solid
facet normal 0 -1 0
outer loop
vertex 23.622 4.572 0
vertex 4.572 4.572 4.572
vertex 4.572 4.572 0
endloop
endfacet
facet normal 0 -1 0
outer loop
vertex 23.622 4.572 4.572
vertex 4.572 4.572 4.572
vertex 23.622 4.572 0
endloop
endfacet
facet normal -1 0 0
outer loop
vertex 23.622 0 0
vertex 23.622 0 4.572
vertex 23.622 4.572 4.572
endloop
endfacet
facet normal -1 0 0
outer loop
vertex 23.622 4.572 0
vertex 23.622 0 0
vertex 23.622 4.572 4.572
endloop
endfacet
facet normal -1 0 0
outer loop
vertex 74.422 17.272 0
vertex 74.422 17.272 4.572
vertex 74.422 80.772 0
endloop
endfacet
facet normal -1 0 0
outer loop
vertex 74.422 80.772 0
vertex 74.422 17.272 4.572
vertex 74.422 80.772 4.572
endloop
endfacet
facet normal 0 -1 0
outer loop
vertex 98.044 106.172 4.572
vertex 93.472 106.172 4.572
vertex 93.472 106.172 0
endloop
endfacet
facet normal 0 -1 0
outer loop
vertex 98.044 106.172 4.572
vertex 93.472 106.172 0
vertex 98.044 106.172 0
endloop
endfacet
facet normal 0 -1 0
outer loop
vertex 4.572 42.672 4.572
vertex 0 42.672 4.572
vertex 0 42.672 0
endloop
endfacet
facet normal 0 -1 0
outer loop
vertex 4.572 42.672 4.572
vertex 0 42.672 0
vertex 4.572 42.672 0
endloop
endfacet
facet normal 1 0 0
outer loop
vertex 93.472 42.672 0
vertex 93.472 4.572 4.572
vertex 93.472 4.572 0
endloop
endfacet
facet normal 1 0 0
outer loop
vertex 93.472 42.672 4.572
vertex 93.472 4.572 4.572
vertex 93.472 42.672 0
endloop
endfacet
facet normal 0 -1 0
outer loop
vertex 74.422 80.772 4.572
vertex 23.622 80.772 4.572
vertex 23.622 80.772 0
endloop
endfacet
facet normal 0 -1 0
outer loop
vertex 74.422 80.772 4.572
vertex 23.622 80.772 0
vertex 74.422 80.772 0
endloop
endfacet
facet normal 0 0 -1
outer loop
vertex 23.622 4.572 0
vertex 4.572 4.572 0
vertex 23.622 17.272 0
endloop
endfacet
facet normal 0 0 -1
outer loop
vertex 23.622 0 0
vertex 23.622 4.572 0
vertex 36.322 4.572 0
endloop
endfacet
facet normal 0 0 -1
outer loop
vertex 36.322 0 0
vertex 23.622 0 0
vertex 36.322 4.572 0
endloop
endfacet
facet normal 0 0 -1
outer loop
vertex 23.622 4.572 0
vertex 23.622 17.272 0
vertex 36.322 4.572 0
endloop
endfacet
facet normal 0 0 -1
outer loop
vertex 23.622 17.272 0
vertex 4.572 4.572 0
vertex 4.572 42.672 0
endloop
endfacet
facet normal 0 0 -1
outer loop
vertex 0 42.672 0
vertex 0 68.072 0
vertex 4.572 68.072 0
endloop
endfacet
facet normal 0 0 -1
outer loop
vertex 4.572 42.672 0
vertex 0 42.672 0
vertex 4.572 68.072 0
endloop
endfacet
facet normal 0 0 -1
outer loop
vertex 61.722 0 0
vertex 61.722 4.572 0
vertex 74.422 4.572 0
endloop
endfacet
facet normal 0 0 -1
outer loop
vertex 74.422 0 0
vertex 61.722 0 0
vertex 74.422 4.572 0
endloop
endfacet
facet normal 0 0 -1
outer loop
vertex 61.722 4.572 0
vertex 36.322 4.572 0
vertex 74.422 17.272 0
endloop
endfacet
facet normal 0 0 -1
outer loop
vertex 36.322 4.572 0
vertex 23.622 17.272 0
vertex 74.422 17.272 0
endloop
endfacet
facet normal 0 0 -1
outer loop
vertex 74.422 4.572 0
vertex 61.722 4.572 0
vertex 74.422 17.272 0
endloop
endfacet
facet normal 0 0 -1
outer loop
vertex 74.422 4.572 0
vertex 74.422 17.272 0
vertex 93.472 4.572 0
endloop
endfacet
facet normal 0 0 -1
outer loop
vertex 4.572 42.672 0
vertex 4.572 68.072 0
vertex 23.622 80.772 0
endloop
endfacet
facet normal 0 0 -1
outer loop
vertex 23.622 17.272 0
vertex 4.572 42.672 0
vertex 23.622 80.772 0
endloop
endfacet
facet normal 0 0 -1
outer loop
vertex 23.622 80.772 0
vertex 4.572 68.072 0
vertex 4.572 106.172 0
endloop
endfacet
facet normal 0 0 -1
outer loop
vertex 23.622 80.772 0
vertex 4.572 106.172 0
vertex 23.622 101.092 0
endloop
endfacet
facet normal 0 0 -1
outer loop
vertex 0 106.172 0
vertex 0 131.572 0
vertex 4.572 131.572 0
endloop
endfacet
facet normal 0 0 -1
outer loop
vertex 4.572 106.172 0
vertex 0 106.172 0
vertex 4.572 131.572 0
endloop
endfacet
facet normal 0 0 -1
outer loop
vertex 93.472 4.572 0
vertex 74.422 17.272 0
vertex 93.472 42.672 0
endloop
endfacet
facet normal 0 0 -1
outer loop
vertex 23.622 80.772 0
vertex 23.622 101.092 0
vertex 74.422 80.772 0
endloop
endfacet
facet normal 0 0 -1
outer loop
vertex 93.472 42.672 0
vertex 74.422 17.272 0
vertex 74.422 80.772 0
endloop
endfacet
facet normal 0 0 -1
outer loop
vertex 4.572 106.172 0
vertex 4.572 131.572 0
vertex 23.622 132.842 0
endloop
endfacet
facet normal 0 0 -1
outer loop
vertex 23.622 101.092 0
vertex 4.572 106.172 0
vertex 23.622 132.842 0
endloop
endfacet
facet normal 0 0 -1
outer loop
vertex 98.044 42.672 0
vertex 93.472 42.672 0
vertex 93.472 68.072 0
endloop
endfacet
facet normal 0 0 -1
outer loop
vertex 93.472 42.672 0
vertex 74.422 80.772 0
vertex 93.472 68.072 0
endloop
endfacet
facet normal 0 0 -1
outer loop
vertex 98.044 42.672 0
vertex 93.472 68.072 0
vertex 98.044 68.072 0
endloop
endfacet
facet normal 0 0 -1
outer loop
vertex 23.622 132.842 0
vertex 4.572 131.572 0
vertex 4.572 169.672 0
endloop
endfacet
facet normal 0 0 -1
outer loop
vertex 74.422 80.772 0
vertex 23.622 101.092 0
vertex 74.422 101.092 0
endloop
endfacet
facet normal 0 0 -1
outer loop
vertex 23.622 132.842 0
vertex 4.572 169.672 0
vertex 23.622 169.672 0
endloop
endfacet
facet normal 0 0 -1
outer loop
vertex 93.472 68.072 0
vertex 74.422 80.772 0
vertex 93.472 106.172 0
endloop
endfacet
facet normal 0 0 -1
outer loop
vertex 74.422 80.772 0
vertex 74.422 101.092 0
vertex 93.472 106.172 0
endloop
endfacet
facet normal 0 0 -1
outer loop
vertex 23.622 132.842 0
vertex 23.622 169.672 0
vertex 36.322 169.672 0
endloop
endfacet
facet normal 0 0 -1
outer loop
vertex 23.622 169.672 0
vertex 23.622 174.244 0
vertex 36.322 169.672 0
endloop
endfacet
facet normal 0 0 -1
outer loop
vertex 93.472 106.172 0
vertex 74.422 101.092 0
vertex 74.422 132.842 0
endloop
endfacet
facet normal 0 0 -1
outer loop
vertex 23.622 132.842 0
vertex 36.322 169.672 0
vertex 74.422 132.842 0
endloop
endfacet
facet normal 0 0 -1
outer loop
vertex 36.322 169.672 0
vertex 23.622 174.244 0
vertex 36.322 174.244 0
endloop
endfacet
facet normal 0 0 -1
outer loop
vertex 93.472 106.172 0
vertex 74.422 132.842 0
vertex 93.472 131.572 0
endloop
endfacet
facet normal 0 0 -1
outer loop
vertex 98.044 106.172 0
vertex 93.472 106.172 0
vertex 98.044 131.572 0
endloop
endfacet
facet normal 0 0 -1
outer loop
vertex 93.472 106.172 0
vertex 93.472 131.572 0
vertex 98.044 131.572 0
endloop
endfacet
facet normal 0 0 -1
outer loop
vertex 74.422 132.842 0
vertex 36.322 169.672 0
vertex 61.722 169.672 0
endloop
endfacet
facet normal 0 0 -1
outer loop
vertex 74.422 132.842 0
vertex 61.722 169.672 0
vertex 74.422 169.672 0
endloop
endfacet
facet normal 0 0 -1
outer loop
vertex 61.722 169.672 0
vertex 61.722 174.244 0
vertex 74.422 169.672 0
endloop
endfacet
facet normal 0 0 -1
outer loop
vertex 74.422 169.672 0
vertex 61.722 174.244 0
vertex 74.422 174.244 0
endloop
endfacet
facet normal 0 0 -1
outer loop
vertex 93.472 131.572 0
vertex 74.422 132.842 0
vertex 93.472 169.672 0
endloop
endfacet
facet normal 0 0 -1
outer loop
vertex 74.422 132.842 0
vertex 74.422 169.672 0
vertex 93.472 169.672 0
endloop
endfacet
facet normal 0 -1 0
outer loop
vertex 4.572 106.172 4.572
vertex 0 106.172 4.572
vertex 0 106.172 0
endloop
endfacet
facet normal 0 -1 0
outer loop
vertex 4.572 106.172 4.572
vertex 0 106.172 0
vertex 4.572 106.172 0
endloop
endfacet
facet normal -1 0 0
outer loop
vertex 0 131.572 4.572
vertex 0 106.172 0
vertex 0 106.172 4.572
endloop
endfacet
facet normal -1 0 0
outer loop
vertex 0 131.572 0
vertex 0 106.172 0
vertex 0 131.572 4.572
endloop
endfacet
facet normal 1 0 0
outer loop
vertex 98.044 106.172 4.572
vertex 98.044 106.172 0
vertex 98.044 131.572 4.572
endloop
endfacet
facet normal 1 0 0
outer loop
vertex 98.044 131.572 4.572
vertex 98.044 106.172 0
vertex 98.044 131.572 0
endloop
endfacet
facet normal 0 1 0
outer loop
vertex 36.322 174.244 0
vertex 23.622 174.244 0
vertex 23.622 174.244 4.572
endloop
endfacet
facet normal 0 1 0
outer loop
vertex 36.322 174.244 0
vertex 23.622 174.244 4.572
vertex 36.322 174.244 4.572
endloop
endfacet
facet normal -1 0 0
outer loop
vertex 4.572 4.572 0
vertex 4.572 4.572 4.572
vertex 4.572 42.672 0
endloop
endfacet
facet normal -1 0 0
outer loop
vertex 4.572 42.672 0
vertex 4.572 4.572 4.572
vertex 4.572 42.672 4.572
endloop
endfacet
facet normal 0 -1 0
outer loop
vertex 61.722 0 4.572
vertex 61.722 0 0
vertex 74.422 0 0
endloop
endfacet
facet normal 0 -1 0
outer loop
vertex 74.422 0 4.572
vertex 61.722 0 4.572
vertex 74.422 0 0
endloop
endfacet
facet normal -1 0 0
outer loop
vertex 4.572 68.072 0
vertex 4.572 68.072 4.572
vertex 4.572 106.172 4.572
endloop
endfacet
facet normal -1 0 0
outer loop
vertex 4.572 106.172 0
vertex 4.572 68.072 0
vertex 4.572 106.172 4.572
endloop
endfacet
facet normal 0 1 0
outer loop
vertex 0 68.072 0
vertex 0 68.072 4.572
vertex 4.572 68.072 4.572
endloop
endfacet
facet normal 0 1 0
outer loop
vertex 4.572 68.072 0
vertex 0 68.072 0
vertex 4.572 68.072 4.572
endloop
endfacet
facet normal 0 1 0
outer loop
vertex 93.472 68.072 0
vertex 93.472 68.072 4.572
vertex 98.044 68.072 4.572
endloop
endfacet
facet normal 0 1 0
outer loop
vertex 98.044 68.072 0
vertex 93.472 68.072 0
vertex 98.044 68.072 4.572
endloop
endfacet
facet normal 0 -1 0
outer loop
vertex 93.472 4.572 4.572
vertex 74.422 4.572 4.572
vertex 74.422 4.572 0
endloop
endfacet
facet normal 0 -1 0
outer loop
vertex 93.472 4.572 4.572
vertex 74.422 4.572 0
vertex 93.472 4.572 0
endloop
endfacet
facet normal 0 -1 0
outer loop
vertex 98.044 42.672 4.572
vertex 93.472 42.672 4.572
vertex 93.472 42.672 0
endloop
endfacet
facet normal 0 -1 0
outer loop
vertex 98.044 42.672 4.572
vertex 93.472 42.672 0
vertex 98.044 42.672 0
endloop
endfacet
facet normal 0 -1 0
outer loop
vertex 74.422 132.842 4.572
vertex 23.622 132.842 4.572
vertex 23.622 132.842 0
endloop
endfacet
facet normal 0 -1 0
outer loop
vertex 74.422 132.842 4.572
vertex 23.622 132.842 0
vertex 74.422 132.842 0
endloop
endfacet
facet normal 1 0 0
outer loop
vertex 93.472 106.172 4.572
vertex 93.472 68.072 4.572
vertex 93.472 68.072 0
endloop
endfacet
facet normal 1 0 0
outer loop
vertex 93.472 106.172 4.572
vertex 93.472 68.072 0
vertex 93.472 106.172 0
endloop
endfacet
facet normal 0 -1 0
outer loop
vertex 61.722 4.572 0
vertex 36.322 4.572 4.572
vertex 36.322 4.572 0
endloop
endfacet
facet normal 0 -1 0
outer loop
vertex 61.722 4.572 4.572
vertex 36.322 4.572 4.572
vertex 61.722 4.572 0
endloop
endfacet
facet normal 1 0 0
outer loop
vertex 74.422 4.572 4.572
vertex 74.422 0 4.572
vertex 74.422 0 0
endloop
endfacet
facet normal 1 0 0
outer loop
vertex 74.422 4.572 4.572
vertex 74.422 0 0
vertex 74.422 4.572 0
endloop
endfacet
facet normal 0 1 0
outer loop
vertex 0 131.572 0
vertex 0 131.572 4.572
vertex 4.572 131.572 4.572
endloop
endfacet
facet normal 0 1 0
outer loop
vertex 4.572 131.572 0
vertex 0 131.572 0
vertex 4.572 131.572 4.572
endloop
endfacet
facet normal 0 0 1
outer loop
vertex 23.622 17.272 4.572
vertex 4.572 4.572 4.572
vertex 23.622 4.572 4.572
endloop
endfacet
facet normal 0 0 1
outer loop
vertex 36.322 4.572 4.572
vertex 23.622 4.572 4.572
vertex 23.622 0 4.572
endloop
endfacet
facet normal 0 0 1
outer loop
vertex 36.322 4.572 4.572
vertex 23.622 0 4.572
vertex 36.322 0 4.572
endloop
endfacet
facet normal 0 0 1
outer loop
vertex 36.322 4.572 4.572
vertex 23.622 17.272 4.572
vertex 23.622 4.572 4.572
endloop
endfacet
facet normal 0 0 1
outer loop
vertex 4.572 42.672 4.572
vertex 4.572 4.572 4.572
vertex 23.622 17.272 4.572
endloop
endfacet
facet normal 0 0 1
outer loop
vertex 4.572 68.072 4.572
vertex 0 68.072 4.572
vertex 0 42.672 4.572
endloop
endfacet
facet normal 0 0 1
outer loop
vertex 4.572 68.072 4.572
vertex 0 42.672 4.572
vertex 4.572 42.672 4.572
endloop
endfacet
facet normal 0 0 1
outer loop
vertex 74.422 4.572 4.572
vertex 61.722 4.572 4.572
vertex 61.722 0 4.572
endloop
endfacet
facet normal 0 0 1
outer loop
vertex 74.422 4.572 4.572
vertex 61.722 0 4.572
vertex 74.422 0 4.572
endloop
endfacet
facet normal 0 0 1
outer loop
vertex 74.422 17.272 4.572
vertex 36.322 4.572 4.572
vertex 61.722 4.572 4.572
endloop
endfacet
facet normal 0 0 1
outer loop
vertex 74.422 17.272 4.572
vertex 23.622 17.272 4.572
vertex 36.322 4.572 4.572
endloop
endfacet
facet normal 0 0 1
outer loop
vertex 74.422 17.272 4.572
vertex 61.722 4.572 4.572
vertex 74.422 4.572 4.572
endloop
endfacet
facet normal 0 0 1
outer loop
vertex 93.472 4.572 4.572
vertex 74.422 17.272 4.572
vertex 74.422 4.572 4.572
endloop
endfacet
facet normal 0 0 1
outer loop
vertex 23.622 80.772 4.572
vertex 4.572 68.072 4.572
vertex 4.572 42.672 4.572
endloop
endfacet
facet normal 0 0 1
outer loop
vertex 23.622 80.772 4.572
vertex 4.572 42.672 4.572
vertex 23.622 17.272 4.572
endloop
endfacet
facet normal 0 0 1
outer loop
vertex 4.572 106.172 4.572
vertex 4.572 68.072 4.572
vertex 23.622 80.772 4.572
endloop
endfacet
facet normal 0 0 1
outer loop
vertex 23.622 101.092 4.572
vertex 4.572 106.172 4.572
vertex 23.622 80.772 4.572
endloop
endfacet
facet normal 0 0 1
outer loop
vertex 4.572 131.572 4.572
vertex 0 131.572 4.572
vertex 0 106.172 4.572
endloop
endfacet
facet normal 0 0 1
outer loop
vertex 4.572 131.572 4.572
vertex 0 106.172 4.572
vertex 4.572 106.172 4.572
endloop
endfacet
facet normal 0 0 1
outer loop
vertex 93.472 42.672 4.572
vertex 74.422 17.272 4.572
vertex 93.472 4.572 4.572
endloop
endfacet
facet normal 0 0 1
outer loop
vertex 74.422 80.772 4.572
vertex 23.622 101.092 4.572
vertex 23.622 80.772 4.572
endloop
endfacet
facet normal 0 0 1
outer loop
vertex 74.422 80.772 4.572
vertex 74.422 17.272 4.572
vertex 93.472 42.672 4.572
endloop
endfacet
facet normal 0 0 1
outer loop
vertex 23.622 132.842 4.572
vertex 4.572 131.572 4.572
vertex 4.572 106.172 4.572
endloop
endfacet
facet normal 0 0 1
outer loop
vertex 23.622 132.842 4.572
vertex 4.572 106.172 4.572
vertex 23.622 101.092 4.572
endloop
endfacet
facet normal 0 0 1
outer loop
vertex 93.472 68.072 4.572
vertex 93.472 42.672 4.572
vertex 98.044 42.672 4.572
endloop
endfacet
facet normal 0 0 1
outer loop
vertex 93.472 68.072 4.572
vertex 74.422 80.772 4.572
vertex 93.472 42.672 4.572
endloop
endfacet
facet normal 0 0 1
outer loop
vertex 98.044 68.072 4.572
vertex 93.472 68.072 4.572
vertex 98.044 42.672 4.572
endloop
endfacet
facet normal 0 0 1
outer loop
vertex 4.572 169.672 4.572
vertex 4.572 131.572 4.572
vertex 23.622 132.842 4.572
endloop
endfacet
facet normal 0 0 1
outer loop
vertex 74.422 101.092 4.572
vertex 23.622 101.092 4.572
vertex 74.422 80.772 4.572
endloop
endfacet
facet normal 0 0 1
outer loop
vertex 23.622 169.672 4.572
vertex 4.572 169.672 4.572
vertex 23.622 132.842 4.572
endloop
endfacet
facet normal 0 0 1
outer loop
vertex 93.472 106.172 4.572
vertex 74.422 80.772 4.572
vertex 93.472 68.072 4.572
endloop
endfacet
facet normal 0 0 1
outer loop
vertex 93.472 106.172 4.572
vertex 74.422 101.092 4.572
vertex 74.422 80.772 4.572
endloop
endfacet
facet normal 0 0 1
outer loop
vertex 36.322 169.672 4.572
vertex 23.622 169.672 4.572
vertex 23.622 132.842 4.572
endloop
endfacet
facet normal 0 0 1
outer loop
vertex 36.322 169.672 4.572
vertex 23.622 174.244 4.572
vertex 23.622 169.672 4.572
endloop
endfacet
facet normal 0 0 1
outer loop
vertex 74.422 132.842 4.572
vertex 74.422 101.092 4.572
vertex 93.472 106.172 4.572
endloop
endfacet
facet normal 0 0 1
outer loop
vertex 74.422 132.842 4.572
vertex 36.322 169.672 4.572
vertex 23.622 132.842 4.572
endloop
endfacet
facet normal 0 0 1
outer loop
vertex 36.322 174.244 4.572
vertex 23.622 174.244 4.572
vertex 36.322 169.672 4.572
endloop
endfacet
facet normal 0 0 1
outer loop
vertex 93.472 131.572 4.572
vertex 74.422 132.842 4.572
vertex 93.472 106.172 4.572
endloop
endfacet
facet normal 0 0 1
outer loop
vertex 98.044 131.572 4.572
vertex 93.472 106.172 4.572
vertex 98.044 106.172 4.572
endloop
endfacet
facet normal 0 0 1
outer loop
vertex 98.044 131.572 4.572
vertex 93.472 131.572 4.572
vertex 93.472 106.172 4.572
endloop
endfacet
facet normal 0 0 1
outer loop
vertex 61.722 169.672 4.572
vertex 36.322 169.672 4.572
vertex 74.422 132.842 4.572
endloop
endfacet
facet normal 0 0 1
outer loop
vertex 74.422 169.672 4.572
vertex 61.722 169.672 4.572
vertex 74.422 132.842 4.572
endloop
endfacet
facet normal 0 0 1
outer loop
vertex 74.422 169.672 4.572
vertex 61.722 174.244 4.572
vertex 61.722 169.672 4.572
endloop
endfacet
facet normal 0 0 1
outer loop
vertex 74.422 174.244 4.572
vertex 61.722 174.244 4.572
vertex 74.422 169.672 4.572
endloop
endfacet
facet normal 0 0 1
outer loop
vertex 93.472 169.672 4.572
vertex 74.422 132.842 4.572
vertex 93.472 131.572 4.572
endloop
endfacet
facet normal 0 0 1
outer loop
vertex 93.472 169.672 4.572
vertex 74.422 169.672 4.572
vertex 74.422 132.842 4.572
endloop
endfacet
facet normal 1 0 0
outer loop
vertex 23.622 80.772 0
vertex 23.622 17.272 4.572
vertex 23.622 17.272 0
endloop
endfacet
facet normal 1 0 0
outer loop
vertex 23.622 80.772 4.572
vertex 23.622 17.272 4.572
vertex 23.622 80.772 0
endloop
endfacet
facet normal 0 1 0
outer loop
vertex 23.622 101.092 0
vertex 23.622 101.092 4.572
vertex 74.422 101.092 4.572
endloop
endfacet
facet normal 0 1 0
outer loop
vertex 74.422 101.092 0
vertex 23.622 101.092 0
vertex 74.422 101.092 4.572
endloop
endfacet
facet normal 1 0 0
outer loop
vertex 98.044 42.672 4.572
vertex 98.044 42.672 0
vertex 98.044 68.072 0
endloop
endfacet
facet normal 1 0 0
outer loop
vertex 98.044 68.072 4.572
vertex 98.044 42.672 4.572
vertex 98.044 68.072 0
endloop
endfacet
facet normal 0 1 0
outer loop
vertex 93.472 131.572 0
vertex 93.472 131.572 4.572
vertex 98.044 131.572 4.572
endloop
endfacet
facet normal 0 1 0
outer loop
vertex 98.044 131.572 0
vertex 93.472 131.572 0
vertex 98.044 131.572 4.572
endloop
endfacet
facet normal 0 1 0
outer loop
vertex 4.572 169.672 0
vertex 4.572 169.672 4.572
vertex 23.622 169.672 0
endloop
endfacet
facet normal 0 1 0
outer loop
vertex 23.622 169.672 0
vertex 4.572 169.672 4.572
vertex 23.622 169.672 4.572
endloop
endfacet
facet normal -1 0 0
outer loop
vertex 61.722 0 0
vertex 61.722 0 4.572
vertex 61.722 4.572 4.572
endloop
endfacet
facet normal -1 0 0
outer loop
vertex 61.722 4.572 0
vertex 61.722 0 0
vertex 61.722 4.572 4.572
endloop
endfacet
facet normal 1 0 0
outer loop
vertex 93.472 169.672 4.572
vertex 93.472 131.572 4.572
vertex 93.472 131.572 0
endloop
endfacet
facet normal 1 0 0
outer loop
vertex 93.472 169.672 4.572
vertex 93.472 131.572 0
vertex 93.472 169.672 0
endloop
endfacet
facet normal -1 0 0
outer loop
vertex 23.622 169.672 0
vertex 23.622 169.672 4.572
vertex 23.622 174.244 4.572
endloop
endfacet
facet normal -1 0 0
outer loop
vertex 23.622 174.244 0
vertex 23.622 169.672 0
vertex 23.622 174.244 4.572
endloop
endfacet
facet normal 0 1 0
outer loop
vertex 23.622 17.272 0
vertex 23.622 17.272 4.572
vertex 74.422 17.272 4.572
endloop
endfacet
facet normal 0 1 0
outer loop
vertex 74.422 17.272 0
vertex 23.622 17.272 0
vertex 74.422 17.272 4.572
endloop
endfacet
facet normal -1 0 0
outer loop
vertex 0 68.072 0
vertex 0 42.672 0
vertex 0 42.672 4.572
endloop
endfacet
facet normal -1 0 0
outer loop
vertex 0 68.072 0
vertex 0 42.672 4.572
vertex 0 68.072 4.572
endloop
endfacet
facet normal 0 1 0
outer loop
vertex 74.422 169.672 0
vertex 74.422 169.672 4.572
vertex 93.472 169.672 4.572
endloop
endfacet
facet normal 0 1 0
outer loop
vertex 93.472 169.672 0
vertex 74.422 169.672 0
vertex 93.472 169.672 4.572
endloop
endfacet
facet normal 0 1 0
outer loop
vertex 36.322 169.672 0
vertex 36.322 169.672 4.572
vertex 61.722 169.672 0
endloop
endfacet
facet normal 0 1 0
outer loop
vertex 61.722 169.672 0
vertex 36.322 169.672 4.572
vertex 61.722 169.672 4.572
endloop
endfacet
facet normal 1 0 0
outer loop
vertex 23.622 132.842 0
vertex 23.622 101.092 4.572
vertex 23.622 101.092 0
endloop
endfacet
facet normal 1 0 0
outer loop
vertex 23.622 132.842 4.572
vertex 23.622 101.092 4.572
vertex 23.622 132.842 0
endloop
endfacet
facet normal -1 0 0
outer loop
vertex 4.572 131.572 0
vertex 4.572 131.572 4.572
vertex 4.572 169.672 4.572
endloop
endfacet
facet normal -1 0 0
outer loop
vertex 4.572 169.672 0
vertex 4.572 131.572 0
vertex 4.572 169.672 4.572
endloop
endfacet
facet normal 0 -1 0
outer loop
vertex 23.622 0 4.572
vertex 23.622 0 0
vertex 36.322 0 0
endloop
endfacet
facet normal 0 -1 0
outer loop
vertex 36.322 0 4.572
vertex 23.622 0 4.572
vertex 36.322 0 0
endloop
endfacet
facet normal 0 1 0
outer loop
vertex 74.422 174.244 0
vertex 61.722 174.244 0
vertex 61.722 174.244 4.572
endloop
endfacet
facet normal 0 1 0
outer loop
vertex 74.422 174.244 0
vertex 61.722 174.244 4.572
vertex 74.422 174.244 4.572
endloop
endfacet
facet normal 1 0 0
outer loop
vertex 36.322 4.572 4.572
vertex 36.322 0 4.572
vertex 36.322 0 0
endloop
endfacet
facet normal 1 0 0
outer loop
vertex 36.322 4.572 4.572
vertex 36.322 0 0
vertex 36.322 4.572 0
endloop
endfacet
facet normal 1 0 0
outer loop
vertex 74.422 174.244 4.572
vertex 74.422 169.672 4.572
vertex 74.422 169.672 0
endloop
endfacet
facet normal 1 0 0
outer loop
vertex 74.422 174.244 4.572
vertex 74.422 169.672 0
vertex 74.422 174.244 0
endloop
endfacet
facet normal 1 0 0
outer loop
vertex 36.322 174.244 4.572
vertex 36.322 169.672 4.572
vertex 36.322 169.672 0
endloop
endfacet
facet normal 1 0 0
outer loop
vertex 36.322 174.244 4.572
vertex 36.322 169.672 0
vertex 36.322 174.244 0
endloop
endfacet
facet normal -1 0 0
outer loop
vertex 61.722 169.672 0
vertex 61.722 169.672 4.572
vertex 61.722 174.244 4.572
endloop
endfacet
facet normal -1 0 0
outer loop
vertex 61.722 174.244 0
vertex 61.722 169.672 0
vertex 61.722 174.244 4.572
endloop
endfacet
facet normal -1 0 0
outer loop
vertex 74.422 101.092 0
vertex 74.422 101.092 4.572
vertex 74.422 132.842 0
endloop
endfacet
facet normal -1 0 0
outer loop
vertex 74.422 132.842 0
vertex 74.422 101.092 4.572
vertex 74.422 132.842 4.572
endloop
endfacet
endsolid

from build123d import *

# Parameters (mm, degrees)
SKETCH1_W           = 98.044
SKETCH1_H           = 174.244
BOSS_EXTRUDE1_DEPTH = 4.572
SKETCH2_W           = 23.622
SKETCH2_H           = 4.572
SKETCH2_W_2         = 25.4
CUT_EXTRUDE1_DEPTH  = 4.572
SKETCH3_W           = 4.572
SKETCH3_H           = 38.1
CUT_EXTRUDE2_DEPTH  = 4.572
SKETCH4_W           = 50.8
SKETCH4_H           = 63.5
SKETCH4_H_2         = 31.75
CUT_EXTRUDE3_DEPTH  = 4.572


with BuildPart() as part:
    # Sketch1 → Boss-Extrude1 (new body)
    with BuildSketch(Plane.XY):
        with Locations((49.022, 87.122)):
            Rectangle(SKETCH1_W, SKETCH1_H)
    extrude(amount=BOSS_EXTRUDE1_DEPTH)

    # Sketch2 → Cut-Extrude1 (cut)
    with BuildSketch(Plane.XY.offset(4.572)):
        with Locations((11.811, 2.286)):
            Rectangle(SKETCH2_W, SKETCH2_H)
        with Locations((49.022, 2.286)):
            Rectangle(SKETCH2_W_2, SKETCH2_H)
        with Locations((86.233, 2.286)):
            Rectangle(SKETCH2_W, SKETCH2_H)
        with Locations((11.811, 171.958)):
            Rectangle(SKETCH2_W, SKETCH2_H)
        with Locations((49.022, 171.958)):
            Rectangle(SKETCH2_W_2, SKETCH2_H)
        with Locations((86.233, 171.958)):
            Rectangle(SKETCH2_W, SKETCH2_H)
    extrude(amount=-CUT_EXTRUDE1_DEPTH, mode=Mode.SUBTRACT)

    # Sketch3 → Cut-Extrude2 (cut)
    with BuildSketch(Plane.XY.offset(4.572)):
        with Locations((2.286, 23.622)):
            Rectangle(SKETCH3_W, SKETCH3_H)
        with Locations((95.758, 23.622)):
            Rectangle(SKETCH3_W, SKETCH3_H)
        with Locations((2.286, 87.122)):
            Rectangle(SKETCH3_W, SKETCH3_H)
        with Locations((2.286, 150.622)):
            Rectangle(SKETCH3_W, SKETCH3_H)
        with Locations((95.758, 150.622)):
            Rectangle(SKETCH3_W, SKETCH3_H)
        with Locations((95.758, 87.122)):
            Rectangle(SKETCH3_W, SKETCH3_H)
    extrude(amount=-CUT_EXTRUDE2_DEPTH, mode=Mode.SUBTRACT)

    # Sketch4 → Cut-Extrude3 (cut)
    with BuildSketch(Plane.XY.offset(4.572)):
        with Locations((49.022, 49.022)):
            Rectangle(SKETCH4_W, SKETCH4_H)
        with Locations((49.022, 116.967)):
            Rectangle(SKETCH4_W, SKETCH4_H_2)
    extrude(amount=-CUT_EXTRUDE3_DEPTH, mode=Mode.SUBTRACT)


solid = part.part
